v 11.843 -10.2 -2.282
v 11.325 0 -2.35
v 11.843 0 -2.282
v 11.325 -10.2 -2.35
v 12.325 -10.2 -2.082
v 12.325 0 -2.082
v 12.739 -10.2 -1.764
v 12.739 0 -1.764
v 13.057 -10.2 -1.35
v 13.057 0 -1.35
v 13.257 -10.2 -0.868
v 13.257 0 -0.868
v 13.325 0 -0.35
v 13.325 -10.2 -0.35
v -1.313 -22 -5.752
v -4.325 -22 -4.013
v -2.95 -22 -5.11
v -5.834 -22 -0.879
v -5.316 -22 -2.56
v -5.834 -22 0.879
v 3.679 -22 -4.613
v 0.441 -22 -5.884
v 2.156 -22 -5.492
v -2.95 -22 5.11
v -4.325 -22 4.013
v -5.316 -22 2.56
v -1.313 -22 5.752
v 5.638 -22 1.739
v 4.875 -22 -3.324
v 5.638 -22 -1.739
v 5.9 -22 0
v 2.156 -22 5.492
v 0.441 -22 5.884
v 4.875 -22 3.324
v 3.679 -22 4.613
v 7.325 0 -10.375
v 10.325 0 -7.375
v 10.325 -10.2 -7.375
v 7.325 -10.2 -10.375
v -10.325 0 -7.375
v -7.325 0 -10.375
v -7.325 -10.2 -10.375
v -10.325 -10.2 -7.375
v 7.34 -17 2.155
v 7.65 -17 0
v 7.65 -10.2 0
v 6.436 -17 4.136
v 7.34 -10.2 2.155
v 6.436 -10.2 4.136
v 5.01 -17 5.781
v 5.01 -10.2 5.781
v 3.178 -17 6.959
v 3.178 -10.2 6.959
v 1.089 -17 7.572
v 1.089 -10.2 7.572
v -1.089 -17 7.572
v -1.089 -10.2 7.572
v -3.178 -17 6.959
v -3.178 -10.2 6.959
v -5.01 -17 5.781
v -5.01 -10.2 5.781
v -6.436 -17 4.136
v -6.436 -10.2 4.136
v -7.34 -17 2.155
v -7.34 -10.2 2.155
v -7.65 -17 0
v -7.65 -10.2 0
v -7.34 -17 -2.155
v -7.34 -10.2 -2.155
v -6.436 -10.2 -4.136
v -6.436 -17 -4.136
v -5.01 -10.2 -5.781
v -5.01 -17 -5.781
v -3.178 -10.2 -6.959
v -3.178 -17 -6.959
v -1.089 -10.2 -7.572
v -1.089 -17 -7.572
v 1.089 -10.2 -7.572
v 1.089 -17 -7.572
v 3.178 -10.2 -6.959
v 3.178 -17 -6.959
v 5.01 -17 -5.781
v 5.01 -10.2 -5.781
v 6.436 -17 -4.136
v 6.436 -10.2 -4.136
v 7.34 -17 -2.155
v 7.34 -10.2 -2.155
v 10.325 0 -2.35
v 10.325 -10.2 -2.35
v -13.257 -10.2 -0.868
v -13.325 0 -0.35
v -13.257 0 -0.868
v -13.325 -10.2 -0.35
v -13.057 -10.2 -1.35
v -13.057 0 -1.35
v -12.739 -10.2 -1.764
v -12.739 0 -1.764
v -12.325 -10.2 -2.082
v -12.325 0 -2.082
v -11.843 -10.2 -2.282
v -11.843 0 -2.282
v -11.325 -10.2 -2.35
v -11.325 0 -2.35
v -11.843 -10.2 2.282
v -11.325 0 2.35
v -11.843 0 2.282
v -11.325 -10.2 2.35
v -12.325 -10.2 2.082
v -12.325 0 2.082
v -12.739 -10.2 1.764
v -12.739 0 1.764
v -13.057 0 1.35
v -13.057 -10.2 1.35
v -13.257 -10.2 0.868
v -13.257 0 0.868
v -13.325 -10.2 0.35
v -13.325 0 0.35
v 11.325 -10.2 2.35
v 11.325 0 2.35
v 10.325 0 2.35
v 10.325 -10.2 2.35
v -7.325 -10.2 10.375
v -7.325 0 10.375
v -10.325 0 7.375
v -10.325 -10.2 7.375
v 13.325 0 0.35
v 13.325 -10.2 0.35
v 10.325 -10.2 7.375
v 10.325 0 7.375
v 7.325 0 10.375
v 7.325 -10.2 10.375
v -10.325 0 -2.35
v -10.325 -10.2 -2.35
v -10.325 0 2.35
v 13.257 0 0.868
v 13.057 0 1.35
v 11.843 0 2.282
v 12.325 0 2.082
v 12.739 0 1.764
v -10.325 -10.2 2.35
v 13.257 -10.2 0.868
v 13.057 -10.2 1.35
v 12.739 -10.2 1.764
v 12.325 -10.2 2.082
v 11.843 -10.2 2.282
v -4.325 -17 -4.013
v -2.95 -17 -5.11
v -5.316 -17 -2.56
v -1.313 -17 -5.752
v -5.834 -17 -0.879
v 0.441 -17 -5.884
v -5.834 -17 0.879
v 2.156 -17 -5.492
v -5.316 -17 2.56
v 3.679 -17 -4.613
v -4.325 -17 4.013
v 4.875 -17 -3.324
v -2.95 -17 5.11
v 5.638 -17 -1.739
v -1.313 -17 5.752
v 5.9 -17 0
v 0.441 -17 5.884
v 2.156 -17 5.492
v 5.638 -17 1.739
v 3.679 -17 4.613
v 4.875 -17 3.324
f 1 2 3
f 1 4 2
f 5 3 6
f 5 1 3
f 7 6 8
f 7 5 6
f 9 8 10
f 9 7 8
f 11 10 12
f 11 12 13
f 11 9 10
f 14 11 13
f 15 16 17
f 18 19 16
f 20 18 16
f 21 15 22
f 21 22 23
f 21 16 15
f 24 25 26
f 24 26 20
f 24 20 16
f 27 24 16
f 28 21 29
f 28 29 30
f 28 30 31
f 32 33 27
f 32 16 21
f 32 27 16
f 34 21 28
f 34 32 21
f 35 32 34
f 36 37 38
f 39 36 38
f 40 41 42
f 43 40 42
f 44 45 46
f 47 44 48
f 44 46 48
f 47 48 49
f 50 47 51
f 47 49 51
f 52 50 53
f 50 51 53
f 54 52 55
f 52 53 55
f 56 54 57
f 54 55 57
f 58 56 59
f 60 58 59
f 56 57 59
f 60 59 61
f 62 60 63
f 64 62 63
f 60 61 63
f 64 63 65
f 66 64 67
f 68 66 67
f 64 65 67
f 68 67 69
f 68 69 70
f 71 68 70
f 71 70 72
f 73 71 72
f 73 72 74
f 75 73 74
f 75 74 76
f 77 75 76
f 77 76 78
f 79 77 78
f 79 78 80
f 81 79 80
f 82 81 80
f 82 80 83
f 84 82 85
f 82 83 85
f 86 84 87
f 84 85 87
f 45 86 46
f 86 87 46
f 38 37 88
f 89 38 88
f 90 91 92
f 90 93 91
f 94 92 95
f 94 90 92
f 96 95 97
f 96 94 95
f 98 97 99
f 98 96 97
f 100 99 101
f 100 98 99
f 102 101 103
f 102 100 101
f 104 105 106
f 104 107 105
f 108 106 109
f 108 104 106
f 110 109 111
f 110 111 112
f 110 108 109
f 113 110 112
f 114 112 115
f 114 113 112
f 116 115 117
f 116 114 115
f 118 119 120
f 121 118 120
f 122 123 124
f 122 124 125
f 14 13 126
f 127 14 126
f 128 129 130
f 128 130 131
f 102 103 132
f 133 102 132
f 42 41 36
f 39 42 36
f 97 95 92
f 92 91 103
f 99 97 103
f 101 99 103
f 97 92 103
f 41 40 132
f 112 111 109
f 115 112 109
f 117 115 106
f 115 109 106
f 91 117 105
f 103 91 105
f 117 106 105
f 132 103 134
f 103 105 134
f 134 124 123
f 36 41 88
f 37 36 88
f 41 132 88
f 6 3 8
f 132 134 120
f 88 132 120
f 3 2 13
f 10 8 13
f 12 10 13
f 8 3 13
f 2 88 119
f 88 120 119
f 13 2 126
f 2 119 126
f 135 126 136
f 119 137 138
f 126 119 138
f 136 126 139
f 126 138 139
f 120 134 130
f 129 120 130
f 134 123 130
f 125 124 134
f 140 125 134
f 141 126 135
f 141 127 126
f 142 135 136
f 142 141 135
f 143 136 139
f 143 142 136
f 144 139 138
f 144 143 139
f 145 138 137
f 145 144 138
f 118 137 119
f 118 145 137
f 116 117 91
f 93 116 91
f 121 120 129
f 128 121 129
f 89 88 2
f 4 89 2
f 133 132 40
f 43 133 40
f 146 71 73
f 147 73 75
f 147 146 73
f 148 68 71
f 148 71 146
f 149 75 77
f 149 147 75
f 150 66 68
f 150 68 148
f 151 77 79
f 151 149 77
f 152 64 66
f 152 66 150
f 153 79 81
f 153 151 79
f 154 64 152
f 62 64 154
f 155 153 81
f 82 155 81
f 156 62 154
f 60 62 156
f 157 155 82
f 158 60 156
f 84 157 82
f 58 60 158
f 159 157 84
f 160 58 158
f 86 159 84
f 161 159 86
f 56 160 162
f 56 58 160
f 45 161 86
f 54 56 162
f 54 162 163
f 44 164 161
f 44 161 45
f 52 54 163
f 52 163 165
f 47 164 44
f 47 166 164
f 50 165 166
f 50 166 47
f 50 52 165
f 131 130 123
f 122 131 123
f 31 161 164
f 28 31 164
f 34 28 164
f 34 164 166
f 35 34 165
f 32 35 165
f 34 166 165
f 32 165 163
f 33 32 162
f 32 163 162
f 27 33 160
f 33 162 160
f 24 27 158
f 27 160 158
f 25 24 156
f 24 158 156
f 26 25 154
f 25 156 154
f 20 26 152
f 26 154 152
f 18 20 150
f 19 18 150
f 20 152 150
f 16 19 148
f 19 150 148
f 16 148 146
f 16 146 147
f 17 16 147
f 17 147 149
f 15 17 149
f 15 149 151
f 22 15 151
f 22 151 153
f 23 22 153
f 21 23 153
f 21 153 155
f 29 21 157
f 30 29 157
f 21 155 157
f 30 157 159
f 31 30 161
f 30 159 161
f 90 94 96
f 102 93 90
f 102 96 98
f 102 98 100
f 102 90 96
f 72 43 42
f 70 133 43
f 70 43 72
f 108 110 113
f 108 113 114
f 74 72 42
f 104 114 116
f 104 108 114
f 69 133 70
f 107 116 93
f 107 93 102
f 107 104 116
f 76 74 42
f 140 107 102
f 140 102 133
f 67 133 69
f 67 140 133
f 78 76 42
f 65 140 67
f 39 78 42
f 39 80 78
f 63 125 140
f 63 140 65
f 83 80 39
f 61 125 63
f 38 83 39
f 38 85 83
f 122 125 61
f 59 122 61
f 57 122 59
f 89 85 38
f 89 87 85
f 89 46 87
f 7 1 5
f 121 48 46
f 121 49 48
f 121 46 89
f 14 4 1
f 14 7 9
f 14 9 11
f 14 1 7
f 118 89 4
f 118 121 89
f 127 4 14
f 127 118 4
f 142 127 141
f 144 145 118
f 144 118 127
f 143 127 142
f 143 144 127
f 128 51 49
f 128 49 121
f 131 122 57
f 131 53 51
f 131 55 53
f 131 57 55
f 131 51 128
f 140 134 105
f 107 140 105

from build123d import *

# Parameters (mm, degrees)
F1_DEPTH = 10.2
F2_R     = 2
F3_R     = 7.65
F4_DEPTH = 6.8
F5_SIZE  = 3
F6_R     = 5.9
F7_DEPTH = 5


with BuildPart() as f1:
    # F0 (on Front) → F1 (new body)
    with BuildSketch(Plane.XZ):
        Polygon((10.325, 2.35), (10.325, 10.375), (-10.325, 10.375), (-10.325, 2.35), (-13.325, 2.35), (-13.325, -2.35), (-10.325, -2.35), (-10.325, -10.375), (10.325, -10.375), (10.325, -2.35), (13.325, -2.35), (13.325, 2.35), align=None)
    extrude(amount=F1_DEPTH)

    # F2
    f2_edges = [f1.edges().sort_by_distance(p)[0] for p in [
        (-13.325, -5.1, -2.35),
        (-13.325, -5.1, 2.35),
        (13.325, -5.1, -2.35),
        (13.325, -5.1, 2.35),
    ]]
    fillet(f2_edges, radius=F2_R)

    # F3 (on face) → F4 (join)
    with BuildSketch(Plane.XZ.offset(10.2)):
        Circle(F3_R)
    extrude(amount=F4_DEPTH)

    # F5
    f5_edges = [f1.edges().sort_by_distance(p)[0] for p in [
        (-10.325, -5.1, -10.375),
        (-10.325, -5.1, 10.375),
        (10.325, -5.1, -10.375),
        (10.325, -5.1, 10.375),
    ]]
    chamfer(f5_edges, length=F5_SIZE)

    # F6 (on face) → F7 (join)
    with BuildSketch(Plane.XZ.offset(17)):
        Circle(F6_R)
    extrude(amount=F7_DEPTH)


solid = f1.part
